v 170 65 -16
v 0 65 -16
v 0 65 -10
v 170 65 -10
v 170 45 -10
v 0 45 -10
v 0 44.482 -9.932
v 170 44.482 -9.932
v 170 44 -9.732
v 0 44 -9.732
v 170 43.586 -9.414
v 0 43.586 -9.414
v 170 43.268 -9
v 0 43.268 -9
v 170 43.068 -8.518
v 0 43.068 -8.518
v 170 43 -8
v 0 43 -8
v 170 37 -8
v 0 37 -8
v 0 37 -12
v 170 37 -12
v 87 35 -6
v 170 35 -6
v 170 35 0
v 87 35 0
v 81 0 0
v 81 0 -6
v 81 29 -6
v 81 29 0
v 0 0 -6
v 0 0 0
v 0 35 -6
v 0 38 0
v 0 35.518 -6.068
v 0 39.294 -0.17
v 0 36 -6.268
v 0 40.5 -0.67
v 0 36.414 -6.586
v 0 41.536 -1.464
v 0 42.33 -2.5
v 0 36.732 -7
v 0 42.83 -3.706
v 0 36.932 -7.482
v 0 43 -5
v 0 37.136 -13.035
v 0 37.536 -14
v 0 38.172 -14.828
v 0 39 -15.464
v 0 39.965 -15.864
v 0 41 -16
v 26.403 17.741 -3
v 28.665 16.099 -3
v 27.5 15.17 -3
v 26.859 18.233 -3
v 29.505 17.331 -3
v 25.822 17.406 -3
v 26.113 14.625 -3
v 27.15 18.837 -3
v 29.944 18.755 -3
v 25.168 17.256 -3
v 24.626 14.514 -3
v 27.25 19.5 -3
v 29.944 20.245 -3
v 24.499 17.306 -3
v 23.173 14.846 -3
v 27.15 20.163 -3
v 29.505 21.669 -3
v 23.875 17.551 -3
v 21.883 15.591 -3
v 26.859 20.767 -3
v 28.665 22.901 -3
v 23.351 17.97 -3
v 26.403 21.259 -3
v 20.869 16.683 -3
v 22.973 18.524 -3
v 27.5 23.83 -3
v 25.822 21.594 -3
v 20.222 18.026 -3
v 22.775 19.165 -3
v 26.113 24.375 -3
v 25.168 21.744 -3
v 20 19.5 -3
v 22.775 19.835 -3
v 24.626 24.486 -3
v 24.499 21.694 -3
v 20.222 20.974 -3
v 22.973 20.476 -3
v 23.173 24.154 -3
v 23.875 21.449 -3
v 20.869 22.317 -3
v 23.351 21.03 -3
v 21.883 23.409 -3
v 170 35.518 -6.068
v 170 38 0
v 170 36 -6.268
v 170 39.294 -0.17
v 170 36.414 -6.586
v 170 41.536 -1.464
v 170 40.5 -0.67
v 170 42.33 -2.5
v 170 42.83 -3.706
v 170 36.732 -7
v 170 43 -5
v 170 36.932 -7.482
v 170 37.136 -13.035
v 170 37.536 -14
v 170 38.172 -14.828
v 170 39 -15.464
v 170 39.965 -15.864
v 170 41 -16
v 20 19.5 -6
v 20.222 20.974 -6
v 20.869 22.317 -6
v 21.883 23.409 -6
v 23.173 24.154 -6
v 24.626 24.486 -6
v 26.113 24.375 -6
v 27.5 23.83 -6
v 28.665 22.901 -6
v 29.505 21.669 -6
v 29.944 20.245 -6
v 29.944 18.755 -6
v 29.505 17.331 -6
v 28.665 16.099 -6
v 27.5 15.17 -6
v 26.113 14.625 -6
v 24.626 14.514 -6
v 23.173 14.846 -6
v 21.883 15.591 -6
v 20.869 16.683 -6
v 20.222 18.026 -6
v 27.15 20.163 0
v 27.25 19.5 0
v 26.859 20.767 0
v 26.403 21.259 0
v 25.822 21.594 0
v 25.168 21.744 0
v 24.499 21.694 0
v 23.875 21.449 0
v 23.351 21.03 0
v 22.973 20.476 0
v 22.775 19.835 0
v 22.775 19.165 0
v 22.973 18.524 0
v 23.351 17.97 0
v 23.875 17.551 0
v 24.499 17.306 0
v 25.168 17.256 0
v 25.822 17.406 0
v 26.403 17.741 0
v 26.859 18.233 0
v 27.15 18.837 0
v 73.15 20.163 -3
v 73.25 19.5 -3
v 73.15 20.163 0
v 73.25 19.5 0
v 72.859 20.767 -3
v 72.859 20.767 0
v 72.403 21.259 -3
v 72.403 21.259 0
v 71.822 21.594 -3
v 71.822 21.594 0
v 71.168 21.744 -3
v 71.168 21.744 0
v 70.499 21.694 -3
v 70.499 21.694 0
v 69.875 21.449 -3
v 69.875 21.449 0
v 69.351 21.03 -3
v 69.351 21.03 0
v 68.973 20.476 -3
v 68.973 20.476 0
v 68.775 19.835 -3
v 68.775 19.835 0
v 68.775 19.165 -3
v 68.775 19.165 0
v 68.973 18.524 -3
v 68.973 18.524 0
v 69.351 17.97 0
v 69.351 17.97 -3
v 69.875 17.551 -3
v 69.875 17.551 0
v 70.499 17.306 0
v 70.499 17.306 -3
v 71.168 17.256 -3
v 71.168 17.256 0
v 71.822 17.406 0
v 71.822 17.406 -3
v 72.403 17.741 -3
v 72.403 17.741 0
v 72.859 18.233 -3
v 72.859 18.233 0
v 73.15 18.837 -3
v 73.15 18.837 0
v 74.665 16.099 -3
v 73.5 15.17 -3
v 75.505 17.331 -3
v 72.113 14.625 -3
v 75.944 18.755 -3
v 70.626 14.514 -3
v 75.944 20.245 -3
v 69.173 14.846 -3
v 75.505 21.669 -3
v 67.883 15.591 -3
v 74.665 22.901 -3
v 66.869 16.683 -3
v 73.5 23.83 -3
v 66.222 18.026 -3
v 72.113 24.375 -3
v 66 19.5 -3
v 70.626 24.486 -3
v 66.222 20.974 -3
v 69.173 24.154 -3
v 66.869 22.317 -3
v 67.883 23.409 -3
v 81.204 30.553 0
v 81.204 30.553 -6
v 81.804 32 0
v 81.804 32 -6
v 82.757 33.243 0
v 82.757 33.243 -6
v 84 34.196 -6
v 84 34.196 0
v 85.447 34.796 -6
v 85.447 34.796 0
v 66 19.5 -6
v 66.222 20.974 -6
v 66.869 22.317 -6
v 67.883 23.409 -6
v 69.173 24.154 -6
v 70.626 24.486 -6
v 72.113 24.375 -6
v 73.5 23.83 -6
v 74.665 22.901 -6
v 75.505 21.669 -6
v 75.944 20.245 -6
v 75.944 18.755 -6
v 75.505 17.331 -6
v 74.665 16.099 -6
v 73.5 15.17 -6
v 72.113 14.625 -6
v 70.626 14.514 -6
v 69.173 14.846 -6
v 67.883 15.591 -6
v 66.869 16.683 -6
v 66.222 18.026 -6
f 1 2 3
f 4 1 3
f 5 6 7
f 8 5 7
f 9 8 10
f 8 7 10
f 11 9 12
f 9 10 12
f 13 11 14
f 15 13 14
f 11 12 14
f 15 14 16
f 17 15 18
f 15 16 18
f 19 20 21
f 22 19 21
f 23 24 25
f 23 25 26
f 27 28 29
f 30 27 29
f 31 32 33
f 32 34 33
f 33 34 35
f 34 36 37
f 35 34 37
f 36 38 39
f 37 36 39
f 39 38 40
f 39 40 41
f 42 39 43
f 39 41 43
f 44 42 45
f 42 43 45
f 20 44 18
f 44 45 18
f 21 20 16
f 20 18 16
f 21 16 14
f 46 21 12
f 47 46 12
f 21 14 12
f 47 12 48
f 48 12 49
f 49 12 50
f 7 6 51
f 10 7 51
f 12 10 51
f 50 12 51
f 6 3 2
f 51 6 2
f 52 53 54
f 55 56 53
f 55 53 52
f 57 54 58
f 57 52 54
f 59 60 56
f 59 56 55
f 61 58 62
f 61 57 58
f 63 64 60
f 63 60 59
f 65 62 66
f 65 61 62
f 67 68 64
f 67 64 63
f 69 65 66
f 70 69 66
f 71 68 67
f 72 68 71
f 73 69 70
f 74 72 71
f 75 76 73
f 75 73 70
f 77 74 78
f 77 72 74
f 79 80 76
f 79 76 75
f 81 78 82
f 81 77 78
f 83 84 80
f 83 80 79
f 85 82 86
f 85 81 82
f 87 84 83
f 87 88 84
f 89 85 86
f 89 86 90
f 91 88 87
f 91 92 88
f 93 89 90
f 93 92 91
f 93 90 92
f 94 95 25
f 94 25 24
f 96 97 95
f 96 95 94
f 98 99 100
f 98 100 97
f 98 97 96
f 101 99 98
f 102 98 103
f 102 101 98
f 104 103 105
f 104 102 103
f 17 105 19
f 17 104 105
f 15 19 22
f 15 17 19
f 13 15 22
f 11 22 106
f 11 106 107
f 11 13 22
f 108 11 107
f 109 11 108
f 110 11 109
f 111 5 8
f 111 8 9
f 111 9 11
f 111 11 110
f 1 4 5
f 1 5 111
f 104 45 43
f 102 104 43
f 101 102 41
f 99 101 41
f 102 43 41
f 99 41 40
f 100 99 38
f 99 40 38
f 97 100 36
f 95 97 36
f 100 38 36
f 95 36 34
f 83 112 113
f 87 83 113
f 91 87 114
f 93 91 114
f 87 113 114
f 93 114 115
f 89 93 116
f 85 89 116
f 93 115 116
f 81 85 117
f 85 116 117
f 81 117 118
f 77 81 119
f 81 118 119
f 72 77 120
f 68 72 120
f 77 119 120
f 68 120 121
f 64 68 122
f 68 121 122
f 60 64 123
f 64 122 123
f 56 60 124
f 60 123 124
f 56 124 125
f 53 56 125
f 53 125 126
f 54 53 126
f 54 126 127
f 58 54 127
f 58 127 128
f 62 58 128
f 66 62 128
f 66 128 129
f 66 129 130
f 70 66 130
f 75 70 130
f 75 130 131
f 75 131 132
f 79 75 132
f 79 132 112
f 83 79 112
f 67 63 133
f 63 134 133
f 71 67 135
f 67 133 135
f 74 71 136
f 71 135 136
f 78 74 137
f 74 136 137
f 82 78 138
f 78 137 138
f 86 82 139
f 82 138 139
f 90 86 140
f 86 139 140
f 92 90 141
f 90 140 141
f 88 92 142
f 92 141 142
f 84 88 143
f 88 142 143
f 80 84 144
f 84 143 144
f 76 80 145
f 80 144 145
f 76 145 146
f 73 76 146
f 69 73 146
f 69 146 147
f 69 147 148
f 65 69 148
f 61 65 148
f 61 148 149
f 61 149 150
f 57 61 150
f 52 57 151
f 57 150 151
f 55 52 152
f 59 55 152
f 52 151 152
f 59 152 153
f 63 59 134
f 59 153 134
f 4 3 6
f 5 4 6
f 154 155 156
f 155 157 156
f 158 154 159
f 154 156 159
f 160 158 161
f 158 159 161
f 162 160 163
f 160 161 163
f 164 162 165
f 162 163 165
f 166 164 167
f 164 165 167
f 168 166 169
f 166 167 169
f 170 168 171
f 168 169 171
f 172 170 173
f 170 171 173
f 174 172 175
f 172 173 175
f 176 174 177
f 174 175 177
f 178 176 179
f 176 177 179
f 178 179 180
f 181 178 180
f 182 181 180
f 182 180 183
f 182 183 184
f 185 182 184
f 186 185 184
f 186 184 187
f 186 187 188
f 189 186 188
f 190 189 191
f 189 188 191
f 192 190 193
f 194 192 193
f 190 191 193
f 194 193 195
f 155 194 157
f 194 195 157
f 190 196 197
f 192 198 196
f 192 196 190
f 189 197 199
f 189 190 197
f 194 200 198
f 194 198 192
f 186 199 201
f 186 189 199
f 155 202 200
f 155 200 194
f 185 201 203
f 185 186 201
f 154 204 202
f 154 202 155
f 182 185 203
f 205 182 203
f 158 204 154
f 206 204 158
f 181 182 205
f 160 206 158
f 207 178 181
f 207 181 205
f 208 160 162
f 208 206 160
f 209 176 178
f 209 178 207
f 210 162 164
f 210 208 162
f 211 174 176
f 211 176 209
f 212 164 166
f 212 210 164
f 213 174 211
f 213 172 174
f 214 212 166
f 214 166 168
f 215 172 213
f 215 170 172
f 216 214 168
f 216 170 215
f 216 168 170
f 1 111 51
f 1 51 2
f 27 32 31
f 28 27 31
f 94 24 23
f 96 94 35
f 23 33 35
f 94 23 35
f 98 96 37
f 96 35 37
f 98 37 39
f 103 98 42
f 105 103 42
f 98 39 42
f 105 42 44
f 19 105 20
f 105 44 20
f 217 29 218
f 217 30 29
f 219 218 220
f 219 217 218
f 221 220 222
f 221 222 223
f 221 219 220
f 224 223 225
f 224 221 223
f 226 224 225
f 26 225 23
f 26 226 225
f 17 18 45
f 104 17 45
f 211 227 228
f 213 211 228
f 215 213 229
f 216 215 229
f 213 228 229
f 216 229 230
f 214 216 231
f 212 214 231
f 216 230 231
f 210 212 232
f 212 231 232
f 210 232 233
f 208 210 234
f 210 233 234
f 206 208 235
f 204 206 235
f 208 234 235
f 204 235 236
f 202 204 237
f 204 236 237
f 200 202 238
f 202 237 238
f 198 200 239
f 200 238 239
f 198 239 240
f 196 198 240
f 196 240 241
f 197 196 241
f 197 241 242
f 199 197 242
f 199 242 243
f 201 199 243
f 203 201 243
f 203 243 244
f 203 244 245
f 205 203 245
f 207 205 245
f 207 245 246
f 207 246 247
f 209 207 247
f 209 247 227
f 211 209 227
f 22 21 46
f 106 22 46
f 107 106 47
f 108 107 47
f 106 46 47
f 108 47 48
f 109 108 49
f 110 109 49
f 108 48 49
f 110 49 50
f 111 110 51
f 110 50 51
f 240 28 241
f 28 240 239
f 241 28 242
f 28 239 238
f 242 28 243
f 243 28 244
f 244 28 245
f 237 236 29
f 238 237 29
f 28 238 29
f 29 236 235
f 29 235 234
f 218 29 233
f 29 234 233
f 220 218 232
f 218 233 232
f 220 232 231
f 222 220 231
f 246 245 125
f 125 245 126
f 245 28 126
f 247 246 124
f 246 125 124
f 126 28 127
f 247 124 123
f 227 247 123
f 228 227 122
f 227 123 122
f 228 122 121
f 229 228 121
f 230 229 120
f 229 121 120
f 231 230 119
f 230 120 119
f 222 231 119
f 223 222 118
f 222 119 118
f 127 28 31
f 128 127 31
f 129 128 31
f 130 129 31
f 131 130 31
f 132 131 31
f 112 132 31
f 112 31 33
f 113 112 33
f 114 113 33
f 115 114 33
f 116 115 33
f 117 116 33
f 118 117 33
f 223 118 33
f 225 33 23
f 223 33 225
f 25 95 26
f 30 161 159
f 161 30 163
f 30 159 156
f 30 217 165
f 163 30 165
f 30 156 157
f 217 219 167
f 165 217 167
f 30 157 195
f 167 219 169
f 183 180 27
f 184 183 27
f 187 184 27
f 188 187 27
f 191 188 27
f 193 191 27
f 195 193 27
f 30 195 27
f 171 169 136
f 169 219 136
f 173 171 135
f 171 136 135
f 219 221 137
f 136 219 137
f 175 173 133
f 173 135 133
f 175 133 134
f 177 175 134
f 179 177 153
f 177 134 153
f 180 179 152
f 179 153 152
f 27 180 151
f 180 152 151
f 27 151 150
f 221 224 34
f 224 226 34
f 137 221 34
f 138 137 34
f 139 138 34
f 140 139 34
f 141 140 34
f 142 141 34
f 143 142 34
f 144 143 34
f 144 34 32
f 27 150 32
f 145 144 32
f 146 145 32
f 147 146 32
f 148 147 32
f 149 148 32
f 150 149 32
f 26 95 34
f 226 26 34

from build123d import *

# Parameters (mm, degrees)
ESTRUSIONE_ESTRUSIONE1_DEPTH                         = 170
FORO_LAMATO_PER_BULLONE_M5_A_TESTA_ESAGO_D           = 4.5
FORO_LAMATO_PER_BULLONE_M5_A_TESTA_ESAGO_DEPTH       = 30
FORO_LAMATO_PER_BULLONE_M5_A_TESTA_ESAGO_CBORE_D     = 10
FORO_LAMATO_PER_BULLONE_M5_A_TESTA_ESAGO_CBORE_DEPTH = 3
FORO_LAMATO_PER_BULLONE_M5_A_TESTA_ESAGO_TIP         = 1.351936393
SCHIZZO4_W                                           = 89
SCHIZZO4_H                                           = 35
TAGLIO_ESTRUSIONE1_DEPTH                             = 170
RACCORDO1_R                                          = 6


with BuildPart() as part:
    # Schizzo1 → Estrusione-Estrusione1 (new body)
    with BuildSketch(Plane(origin=(0, 0, 0), x_dir=(0, 0, -1), z_dir=(1, 0, 0))):
        with BuildLine():
            Line((0, 0), (6, 0))
            Line((6, 0), (6, 35))
            ThreePointArc((6, 35), (6.585786438, 36.414213562), (8, 37))
            Line((8, 37), (12, 37))
            ThreePointArc((12, 37), (14.828427125, 38.171572875), (16, 41))
            Line((16, 41), (16, 65))
            Line((16, 65), (10, 65))
            Line((10, 65), (10, 45))
            ThreePointArc((10, 45), (9.414213562, 43.585786438), (8, 43))
            Line((8, 43), (5, 43))
            ThreePointArc((5, 43), (1.464466094, 41.535533906), (0, 38))
            Line((0, 38), (0, 0))
        make_face()
    extrude(amount=ESTRUSIONE_ESTRUSIONE1_DEPTH)

    # Foro lamato per Bullone M5 a testa esagonale-1
    with Locations(Plane(origin=(0, 0, -6), x_dir=(-1, 0, 0), z_dir=(0, 0, -1))):
        with Locations((-25, 19.5), (-71, 19.5)):
            CounterBoreHole(FORO_LAMATO_PER_BULLONE_M5_A_TESTA_ESAGO_D / 2, FORO_LAMATO_PER_BULLONE_M5_A_TESTA_ESAGO_CBORE_D / 2, FORO_LAMATO_PER_BULLONE_M5_A_TESTA_ESAGO_CBORE_DEPTH, depth=FORO_LAMATO_PER_BULLONE_M5_A_TESTA_ESAGO_DEPTH)
            with Locations((0, 0, -(FORO_LAMATO_PER_BULLONE_M5_A_TESTA_ESAGO_DEPTH + FORO_LAMATO_PER_BULLONE_M5_A_TESTA_ESAGO_TIP / 2))):  # 118° drill point
                Cone(0, FORO_LAMATO_PER_BULLONE_M5_A_TESTA_ESAGO_D / 2, FORO_LAMATO_PER_BULLONE_M5_A_TESTA_ESAGO_TIP, mode=Mode.SUBTRACT)

    # Schizzo4 → Taglio-Estrusione1 (cut)
    with BuildSketch(Plane(origin=(0, 0, -6), x_dir=(-1, 0, 0), z_dir=(0, 0, -1))):
        with Locations((-125.5, 17.5)):
            Rectangle(SCHIZZO4_W, SCHIZZO4_H)
    extrude(amount=-TAGLIO_ESTRUSIONE1_DEPTH, mode=Mode.SUBTRACT)

    # Raccordo1
    raccordo1_edges = [part.edges().sort_by_distance(p)[0] for p in [
        (81, 35, -3),
    ]]
    fillet(raccordo1_edges, radius=RACCORDO1_R)


solid = part.part
